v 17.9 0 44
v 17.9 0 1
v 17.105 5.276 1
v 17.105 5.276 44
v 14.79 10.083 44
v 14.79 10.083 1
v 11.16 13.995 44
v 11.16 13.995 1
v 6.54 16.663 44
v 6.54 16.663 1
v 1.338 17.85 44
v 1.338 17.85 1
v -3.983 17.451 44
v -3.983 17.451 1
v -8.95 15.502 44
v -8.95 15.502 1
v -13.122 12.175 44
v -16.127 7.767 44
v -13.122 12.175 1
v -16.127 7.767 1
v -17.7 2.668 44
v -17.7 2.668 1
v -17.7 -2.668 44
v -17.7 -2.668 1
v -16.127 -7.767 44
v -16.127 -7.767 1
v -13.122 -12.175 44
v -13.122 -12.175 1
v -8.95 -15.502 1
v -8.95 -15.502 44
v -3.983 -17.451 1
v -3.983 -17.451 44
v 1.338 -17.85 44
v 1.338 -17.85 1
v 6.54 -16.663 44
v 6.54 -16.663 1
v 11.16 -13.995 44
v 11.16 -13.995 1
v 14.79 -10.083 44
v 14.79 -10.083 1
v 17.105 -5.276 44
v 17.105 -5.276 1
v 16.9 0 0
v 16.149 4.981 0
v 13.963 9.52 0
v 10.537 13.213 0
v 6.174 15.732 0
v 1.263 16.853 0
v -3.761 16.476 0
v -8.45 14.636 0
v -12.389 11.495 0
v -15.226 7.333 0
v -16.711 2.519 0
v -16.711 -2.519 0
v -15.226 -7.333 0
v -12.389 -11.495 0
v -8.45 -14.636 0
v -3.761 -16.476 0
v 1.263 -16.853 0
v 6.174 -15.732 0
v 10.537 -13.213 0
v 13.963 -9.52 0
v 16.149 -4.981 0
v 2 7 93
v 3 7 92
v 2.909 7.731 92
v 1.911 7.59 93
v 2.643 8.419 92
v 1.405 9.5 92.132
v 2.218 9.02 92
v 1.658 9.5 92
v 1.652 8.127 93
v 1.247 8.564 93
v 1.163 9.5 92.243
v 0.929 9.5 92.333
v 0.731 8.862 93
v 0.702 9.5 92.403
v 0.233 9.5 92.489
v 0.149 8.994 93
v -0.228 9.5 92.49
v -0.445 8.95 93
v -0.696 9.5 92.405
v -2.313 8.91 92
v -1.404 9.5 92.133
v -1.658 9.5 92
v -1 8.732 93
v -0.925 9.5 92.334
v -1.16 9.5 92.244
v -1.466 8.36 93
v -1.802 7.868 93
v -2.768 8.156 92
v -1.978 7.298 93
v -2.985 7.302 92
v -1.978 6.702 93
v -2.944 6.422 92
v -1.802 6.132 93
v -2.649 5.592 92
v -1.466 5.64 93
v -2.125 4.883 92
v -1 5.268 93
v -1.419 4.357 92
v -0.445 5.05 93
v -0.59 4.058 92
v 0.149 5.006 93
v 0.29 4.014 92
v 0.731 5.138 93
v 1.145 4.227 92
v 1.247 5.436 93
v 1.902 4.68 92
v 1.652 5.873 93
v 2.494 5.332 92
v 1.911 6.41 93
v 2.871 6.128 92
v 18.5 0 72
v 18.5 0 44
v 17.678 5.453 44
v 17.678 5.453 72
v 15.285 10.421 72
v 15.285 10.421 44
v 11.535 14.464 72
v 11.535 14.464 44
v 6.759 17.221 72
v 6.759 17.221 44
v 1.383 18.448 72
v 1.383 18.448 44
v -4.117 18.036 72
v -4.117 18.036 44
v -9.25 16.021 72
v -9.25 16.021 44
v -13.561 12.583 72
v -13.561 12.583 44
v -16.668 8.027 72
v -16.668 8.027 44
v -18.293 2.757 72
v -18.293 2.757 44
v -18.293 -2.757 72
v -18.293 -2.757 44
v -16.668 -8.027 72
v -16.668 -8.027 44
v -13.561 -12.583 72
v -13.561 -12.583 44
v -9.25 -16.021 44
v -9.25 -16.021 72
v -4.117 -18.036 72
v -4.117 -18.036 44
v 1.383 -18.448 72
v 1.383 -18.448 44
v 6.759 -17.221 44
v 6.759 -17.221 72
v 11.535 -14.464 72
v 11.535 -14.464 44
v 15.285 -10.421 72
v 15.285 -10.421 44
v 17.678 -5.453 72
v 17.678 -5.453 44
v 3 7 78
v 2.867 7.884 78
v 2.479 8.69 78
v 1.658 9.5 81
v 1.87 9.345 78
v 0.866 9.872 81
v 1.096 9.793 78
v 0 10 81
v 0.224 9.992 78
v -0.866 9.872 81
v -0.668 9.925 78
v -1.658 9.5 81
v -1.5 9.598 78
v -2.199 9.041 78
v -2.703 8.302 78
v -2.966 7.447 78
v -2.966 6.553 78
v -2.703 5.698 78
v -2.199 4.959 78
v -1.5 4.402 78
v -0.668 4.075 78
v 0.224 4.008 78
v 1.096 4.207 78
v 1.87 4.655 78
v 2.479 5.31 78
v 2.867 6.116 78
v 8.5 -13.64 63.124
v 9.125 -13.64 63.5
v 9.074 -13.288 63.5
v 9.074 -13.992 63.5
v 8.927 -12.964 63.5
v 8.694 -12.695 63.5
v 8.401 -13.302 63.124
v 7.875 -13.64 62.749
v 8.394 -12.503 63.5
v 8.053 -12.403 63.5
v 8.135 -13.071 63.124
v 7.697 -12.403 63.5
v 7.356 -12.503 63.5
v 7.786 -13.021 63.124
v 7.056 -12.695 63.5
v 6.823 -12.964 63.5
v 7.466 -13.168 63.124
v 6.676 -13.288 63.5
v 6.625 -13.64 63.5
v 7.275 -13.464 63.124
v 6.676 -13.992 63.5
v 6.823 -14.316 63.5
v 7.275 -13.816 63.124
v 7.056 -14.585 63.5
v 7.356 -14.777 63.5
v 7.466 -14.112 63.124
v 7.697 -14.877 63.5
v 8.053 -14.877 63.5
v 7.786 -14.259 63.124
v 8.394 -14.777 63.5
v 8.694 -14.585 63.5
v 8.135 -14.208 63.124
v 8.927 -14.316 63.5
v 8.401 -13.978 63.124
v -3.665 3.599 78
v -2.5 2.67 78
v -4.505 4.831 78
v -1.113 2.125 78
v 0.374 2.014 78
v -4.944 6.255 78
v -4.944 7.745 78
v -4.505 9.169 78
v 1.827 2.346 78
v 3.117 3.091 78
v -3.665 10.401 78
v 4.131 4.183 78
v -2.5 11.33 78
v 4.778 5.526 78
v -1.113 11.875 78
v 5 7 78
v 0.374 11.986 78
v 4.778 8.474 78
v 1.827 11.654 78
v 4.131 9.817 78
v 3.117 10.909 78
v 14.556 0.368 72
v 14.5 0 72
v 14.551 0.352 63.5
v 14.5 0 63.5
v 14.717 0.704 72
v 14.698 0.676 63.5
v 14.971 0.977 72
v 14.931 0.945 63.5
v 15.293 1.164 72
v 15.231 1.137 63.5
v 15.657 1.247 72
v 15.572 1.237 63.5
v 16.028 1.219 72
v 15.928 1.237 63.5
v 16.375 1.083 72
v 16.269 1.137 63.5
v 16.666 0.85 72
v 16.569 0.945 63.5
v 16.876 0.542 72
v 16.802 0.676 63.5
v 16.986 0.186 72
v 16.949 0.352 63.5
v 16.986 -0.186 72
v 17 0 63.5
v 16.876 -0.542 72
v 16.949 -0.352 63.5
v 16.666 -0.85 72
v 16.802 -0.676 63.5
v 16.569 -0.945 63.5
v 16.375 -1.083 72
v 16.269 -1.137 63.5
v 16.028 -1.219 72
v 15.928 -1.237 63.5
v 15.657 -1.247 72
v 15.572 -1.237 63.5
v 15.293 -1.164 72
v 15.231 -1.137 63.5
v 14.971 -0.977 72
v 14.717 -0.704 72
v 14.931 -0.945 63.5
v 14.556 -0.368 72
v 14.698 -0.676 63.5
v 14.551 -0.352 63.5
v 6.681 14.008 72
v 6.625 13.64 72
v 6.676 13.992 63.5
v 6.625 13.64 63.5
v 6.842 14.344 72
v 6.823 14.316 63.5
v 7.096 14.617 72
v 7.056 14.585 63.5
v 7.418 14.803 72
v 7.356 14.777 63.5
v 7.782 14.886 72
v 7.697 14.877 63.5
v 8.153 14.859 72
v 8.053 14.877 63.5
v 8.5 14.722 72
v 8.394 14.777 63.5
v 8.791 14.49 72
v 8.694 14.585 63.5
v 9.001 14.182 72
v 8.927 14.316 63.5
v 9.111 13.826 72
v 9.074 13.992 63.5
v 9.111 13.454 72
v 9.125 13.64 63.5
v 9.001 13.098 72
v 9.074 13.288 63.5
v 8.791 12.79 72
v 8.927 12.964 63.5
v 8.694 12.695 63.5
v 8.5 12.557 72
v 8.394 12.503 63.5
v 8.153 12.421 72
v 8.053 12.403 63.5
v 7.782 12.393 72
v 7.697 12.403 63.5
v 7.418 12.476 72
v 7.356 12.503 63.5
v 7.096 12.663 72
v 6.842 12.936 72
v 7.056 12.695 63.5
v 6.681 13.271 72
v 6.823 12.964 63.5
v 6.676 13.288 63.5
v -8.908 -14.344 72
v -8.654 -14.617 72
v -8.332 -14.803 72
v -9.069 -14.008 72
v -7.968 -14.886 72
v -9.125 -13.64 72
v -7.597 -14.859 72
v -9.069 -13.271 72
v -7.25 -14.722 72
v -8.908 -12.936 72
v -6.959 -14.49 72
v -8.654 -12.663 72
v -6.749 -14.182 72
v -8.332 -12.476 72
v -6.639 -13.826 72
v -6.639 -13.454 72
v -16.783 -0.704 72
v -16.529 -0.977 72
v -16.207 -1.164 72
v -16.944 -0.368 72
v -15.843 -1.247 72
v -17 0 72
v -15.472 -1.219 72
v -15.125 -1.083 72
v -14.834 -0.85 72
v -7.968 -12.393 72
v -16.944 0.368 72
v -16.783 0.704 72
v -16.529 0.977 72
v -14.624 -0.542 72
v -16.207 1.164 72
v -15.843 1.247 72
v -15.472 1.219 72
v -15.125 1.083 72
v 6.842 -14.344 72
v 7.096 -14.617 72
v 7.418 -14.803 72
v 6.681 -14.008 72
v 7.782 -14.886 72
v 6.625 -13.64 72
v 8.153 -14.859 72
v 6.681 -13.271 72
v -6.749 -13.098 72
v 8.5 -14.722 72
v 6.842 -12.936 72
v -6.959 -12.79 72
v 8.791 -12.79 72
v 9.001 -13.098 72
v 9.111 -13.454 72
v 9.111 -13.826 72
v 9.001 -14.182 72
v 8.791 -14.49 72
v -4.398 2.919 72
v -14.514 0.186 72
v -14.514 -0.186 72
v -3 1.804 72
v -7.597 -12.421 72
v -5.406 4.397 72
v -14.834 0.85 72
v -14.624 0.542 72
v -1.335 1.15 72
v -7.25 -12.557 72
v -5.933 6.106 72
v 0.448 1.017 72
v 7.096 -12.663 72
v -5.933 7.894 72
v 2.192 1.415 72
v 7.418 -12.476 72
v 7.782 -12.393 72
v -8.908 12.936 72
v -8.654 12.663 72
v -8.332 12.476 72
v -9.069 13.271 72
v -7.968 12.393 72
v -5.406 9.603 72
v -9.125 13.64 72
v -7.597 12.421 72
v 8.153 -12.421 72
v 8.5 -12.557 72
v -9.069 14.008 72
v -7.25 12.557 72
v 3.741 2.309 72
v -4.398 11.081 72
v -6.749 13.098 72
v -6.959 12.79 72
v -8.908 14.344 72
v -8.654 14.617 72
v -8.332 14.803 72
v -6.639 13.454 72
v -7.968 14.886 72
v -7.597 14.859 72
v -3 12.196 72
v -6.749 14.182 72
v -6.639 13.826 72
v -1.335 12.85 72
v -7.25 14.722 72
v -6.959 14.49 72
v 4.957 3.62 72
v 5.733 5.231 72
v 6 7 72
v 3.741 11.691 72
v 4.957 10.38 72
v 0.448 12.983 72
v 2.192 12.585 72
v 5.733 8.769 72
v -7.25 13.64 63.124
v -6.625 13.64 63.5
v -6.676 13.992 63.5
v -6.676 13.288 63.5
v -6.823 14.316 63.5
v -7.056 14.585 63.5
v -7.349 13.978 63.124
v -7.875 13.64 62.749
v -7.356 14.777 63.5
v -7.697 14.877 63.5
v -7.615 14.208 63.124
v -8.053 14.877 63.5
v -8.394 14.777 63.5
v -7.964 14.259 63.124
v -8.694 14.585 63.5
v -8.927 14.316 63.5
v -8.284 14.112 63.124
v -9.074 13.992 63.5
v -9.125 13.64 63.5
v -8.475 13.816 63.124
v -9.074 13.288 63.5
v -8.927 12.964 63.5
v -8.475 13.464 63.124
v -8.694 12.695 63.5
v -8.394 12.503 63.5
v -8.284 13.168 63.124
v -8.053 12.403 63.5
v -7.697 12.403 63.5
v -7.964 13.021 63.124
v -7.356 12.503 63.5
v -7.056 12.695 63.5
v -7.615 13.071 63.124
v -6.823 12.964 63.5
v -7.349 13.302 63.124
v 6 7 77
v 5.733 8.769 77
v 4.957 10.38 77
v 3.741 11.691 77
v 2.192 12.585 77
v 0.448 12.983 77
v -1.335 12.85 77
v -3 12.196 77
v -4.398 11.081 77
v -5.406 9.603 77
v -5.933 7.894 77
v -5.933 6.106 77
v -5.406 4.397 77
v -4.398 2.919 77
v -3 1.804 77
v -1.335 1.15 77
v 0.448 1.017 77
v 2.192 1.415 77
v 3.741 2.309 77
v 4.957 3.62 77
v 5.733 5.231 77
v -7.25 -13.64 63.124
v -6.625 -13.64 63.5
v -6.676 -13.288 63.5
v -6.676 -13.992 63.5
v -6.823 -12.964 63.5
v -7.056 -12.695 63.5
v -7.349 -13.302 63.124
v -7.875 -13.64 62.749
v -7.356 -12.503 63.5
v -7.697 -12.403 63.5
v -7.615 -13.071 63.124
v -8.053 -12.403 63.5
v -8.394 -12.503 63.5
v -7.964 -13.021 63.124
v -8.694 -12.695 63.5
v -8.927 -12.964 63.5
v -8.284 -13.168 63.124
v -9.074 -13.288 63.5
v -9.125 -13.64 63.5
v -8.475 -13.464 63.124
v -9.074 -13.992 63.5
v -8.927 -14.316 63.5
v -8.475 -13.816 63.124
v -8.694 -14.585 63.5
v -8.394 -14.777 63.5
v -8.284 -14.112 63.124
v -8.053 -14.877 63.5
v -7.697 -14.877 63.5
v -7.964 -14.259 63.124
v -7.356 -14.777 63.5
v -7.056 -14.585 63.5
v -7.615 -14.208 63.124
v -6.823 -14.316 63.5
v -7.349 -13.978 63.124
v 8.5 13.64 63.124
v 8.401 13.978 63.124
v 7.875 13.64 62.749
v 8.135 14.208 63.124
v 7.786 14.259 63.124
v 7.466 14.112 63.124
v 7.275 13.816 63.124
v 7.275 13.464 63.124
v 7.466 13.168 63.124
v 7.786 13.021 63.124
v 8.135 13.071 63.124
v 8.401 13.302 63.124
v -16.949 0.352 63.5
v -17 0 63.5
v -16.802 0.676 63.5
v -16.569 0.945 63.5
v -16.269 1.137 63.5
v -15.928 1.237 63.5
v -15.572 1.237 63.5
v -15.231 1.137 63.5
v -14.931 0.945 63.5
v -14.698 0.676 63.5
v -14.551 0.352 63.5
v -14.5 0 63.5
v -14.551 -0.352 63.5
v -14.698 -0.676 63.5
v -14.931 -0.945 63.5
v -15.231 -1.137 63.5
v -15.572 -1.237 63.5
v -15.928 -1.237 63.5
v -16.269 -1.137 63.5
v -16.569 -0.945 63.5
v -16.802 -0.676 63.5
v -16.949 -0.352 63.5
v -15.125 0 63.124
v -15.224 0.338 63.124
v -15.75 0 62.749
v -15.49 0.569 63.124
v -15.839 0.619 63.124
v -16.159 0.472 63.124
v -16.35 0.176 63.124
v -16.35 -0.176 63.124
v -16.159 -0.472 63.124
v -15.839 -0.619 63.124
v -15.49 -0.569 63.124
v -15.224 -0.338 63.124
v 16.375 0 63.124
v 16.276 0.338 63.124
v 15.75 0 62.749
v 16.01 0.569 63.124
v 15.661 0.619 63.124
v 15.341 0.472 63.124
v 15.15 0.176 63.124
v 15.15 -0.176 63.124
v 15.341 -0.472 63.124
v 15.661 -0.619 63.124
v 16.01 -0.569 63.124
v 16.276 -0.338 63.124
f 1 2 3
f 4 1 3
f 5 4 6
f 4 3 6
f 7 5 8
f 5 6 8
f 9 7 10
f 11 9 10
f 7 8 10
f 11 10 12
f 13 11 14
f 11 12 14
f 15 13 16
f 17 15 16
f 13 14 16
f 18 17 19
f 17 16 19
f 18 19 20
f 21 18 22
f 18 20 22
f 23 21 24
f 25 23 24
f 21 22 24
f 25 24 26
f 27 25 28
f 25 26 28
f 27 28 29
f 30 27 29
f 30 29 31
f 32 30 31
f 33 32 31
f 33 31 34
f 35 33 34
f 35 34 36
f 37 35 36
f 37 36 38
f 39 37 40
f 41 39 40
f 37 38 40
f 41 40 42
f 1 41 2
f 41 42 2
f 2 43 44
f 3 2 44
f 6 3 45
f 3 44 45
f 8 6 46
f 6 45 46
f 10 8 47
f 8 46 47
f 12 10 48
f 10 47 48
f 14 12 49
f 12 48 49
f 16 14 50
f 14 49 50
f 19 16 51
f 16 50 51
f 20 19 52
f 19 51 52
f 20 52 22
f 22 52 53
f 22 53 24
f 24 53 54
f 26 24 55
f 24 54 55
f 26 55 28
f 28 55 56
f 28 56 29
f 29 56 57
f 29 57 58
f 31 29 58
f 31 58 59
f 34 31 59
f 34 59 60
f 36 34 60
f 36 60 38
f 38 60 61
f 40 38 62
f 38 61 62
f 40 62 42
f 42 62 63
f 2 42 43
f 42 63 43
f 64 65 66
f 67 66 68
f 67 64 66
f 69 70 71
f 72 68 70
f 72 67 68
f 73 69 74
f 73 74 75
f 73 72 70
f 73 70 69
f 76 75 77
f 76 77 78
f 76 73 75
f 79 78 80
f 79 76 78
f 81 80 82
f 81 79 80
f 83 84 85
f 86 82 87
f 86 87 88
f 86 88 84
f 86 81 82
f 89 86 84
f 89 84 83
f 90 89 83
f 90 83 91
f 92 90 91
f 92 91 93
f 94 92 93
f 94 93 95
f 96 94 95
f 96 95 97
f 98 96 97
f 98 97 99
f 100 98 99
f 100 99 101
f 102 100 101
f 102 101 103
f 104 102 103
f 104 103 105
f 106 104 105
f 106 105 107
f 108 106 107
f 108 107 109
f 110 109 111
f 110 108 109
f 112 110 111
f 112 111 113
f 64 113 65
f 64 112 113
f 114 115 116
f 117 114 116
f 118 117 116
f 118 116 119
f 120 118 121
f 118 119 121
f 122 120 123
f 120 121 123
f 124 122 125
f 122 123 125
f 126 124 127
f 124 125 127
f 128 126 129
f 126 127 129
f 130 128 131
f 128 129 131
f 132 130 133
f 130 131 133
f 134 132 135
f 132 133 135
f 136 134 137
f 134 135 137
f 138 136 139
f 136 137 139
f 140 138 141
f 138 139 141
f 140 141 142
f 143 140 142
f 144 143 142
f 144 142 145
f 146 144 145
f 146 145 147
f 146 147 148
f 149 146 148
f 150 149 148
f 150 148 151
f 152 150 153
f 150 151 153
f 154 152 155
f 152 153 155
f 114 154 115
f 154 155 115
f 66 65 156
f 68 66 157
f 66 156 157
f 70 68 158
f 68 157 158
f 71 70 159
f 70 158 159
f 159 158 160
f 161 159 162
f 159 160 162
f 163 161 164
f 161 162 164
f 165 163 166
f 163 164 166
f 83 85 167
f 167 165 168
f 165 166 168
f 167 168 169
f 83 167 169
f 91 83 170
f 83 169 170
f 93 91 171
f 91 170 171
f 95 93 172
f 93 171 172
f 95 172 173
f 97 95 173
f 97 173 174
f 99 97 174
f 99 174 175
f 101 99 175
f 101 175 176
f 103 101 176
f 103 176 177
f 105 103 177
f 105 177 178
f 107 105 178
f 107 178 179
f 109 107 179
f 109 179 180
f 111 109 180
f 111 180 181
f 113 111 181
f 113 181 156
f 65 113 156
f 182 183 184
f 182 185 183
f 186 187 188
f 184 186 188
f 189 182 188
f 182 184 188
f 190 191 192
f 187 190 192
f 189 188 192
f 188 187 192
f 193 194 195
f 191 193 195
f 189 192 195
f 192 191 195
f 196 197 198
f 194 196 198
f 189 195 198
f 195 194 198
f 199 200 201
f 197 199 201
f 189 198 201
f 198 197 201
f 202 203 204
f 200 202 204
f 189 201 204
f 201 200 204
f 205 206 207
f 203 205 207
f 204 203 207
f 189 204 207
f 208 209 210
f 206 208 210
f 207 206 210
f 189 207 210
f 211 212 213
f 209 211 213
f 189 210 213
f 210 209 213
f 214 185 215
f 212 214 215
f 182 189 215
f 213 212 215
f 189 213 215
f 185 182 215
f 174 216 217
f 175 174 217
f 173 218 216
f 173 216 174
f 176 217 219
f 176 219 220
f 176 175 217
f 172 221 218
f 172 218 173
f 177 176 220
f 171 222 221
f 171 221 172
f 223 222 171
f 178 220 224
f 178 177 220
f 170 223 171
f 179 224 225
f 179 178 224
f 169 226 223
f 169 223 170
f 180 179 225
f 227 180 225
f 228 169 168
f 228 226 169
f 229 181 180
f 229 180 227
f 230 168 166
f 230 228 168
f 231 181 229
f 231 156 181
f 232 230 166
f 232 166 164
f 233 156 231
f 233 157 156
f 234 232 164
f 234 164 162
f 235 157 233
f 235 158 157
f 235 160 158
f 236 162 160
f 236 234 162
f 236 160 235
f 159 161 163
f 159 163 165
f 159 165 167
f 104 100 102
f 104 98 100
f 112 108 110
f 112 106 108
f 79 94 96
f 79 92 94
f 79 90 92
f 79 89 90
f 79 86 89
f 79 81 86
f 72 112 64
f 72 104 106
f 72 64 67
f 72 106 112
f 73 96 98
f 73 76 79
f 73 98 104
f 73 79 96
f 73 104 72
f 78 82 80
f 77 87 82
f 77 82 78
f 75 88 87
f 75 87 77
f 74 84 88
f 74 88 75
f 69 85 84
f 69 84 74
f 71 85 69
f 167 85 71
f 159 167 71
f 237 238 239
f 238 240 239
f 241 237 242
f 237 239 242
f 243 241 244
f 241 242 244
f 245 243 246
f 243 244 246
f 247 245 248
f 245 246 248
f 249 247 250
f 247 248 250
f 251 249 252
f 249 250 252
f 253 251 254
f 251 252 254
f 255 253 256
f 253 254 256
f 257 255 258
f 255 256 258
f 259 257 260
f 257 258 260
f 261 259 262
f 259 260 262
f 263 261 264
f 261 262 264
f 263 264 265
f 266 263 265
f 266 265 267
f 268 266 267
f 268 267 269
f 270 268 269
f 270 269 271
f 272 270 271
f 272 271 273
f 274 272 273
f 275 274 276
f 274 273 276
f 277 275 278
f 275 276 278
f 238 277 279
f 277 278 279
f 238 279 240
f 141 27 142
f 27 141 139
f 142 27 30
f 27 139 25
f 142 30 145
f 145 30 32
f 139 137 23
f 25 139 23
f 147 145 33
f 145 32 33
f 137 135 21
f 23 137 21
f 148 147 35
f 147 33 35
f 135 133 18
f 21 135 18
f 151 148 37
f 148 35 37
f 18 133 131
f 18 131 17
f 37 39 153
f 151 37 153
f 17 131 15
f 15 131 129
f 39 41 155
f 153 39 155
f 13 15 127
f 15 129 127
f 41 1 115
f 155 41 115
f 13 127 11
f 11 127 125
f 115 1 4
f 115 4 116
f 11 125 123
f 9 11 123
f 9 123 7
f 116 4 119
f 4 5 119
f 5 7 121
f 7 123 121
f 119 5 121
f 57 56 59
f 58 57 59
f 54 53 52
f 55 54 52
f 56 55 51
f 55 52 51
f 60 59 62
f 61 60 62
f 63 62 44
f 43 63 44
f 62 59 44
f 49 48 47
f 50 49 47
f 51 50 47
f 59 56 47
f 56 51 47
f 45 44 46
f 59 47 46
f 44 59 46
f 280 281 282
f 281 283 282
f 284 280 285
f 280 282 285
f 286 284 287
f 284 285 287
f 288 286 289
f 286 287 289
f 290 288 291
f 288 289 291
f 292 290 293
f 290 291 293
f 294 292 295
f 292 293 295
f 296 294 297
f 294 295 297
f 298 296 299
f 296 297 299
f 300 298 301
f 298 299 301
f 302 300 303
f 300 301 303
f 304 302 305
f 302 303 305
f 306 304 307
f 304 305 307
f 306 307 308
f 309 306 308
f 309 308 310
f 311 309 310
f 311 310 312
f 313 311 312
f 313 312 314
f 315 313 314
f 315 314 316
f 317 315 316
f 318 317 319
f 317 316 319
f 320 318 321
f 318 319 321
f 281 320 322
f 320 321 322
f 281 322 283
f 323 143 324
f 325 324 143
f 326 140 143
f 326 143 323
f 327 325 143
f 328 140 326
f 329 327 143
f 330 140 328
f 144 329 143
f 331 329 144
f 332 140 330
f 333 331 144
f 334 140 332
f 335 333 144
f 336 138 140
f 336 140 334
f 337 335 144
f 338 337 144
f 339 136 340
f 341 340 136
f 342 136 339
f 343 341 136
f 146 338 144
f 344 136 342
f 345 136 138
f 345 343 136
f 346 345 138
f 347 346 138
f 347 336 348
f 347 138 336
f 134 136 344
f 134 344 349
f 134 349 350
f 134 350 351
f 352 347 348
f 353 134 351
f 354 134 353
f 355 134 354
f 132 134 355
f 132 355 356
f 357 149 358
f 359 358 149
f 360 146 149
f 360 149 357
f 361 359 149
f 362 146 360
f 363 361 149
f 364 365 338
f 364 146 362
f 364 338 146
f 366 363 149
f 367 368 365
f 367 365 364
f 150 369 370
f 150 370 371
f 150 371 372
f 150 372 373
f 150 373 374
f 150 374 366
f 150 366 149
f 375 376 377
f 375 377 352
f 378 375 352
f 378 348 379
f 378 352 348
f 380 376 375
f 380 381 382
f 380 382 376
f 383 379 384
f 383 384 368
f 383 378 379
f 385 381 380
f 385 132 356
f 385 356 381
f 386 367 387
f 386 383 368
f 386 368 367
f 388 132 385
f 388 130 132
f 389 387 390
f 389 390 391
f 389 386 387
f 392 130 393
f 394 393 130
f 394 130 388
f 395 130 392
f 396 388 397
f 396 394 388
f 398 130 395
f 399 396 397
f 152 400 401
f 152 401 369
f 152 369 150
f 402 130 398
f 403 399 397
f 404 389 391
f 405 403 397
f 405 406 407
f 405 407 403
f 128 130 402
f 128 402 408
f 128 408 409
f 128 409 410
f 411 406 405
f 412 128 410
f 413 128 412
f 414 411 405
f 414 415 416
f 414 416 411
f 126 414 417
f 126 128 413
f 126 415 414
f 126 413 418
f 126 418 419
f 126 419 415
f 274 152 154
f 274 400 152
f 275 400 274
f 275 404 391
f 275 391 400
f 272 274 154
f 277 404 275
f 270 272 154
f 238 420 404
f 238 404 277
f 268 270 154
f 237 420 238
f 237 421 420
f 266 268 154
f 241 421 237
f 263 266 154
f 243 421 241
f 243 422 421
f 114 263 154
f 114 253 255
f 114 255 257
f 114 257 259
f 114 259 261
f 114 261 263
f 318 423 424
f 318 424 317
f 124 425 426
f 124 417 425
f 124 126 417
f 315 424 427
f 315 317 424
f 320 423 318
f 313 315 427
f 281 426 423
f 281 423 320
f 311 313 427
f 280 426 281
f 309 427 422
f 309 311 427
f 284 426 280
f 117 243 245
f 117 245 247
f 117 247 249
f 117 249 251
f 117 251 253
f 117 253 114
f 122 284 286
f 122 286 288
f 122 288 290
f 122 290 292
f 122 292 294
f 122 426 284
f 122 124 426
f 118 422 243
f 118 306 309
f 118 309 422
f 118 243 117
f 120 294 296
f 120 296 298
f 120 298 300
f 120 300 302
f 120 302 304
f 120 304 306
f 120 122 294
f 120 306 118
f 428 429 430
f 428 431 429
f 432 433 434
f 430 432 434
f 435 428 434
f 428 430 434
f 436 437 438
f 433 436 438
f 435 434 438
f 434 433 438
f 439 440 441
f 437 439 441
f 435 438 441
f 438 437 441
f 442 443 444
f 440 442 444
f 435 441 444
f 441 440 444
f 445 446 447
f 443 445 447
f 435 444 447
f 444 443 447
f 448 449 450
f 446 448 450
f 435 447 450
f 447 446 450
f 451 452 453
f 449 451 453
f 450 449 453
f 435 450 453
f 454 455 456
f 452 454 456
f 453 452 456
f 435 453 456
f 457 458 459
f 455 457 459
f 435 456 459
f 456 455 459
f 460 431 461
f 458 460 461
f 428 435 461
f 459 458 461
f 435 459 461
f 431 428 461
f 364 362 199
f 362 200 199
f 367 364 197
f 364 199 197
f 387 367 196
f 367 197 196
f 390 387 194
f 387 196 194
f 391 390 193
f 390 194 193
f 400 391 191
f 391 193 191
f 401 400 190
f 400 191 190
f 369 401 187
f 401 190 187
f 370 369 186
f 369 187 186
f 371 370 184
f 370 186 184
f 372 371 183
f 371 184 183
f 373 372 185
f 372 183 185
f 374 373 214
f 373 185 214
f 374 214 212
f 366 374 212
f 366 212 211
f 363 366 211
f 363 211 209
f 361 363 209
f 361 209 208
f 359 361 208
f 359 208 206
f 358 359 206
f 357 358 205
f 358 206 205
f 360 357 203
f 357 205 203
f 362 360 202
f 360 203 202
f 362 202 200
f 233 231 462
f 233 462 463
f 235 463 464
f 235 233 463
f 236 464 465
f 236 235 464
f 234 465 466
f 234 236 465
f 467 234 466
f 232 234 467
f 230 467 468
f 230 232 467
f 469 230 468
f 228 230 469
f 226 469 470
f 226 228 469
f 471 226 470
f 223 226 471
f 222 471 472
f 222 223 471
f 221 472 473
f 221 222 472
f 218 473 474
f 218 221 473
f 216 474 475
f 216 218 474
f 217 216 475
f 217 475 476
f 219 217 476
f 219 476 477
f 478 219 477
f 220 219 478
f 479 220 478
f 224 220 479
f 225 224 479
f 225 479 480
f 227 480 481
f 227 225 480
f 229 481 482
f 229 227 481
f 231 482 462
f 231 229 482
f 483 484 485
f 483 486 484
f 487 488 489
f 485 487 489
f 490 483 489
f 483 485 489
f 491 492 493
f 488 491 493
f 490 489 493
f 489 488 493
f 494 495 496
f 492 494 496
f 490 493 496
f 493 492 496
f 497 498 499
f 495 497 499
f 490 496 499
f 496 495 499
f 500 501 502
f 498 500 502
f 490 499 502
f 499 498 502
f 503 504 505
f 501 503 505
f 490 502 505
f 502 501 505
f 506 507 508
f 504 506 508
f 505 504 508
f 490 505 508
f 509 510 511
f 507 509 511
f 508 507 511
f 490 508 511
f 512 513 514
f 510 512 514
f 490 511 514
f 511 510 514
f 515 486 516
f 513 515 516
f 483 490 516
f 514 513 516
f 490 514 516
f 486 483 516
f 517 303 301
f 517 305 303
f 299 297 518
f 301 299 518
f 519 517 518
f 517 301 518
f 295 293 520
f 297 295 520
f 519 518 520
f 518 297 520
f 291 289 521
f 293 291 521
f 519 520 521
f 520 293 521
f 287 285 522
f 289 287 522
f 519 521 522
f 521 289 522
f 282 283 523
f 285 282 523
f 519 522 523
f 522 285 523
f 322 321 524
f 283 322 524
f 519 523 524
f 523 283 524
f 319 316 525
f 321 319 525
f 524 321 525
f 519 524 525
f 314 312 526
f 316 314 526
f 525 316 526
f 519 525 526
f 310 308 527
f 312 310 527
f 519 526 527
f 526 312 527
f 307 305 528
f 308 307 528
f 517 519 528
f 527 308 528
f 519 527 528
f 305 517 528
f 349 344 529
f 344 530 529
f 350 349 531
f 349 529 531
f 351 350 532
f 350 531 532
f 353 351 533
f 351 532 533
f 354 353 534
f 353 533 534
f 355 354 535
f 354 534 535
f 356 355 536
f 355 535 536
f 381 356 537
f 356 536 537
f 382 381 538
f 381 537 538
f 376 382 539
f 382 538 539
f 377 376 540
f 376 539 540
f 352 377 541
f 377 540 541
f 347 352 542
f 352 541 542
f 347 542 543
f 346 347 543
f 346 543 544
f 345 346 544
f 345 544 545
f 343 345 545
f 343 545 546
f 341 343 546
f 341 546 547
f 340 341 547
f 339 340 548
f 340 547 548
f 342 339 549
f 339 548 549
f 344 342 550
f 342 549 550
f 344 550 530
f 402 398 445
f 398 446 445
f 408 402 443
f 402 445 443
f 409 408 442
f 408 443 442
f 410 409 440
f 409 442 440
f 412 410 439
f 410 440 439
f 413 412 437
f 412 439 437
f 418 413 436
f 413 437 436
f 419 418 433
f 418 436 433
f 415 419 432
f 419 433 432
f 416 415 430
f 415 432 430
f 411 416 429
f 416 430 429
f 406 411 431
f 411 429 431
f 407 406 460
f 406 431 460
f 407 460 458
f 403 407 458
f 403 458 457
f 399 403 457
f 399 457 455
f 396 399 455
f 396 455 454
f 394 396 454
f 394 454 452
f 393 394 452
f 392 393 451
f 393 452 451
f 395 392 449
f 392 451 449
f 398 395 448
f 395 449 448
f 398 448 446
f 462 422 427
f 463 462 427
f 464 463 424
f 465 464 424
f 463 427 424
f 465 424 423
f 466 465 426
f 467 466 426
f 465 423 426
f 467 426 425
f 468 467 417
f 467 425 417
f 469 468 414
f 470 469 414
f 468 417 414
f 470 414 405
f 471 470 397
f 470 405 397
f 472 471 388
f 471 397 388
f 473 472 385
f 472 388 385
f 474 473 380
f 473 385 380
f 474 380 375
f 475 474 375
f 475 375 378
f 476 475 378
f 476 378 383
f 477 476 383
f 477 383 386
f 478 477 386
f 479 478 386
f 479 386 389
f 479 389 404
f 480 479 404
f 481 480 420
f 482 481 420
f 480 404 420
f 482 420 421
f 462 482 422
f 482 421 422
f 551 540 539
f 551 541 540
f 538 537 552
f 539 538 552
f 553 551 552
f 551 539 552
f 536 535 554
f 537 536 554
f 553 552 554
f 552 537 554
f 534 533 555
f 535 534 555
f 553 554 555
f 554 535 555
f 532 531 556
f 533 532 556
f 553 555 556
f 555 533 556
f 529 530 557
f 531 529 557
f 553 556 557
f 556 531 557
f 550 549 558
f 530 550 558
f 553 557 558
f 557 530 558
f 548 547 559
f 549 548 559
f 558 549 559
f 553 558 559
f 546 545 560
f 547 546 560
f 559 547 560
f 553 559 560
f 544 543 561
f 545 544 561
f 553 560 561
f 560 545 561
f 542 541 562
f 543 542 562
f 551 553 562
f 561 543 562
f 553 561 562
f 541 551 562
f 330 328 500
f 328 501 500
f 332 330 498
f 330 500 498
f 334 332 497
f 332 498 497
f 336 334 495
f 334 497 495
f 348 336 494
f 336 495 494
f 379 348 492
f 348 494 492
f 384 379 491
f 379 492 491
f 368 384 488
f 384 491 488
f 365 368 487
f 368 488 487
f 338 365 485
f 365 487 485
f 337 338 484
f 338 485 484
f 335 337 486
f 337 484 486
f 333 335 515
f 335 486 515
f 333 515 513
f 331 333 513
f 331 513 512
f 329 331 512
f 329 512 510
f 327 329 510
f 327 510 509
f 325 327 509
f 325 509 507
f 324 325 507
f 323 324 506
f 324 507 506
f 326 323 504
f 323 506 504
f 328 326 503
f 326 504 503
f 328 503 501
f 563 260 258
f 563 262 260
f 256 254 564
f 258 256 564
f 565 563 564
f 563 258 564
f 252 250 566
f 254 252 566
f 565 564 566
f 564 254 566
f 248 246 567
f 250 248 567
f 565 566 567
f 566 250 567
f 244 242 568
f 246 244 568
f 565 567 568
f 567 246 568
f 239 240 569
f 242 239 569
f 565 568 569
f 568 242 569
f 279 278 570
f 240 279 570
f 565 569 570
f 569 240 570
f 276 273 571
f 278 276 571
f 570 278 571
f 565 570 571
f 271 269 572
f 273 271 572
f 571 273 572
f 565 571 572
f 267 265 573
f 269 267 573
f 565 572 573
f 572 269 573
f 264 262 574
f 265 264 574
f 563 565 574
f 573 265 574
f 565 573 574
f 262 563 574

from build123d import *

# Parameters (mm, degrees)
SKETCH_1_R          = 17.9
EXTRUDE_1_DEPTH     = 44
SKETCH_2_R          = 18.5
EXTRUDE_2_DEPTH     = 28
SKETCH_3_R          = 6
EXTRUDE_3_DEPTH     = 6
SKETCH_4_R          = 3
EXTRUDE_4_DEPTH     = 15
CUT_EXTRUDE_START   = -12
CUT_EXTRUDE_1_DEPTH = 12
M3X0_5_1_D          = 2.5
M3X0_5_1_DEPTH      = 8.5
M3X0_5_1_TIP        = 0.751075774
CHAMFER_1_SIZE      = 1
CHAMFER_2_SIZE      = 1
CHAMFER_3_SIZE      = 1


with BuildPart() as part:
    # ｽｹｯﾁ1 → ﾎﾞｽ - 押し出し1 (new body)
    with BuildSketch(Plane.XY):
        Circle(SKETCH_1_R)
    extrude(amount=EXTRUDE_1_DEPTH)

    # ｽｹｯﾁ2 → ﾎﾞｽ - 押し出し2 (add)
    with BuildSketch(Plane.XY.offset(44)):
        Circle(SKETCH_2_R)
    extrude(amount=EXTRUDE_2_DEPTH)

    # ｽｹｯﾁ3 → ﾎﾞｽ - 押し出し3 (add)
    with BuildSketch(Plane.XY.offset(72)):
        with Locations((0, 7)):
            Circle(SKETCH_3_R)
    extrude(amount=EXTRUDE_3_DEPTH)

    # ｽｹｯﾁ4 → ﾎﾞｽ - 押し出し4 (add)
    with BuildSketch(Plane.XY.offset(78)):
        with Locations((0, 7)):
            Circle(SKETCH_4_R)
    extrude(amount=EXTRUDE_4_DEPTH)

    # ｽｹｯﾁ5 → ｶｯﾄ - 押し出し1 (cut)
    with BuildSketch(Plane.XY.offset(93).offset(CUT_EXTRUDE_START)):
        with BuildLine():
            ThreePointArc((1.658312395, 9.5), (0, 10), (-1.658312395, 9.5))
            Line((-1.658312395, 9.5), (0, 9.5))
            Line((0, 9.5), (1.658312395, 9.5))
        make_face()
    extrude(amount=CUT_EXTRUDE_1_DEPTH, mode=Mode.SUBTRACT)

    # M3x0.5 ねじ穴1
    with Locations(Plane(origin=(-15.75, 0, 72), x_dir=(1, 0, 0), z_dir=(0, 0, 1))):
        with Locations((0, 0), (7.875, -13.63990011), (23.625, -13.63990011), (31.5, 0), (23.625, 13.63990011), (7.875, 13.63990011)):
            Hole(M3X0_5_1_D / 2, depth=M3X0_5_1_DEPTH)
            with Locations((0, 0, -(M3X0_5_1_DEPTH + M3X0_5_1_TIP / 2))):  # 118° drill point
                Cone(0, M3X0_5_1_D / 2, M3X0_5_1_TIP, mode=Mode.SUBTRACT)

    # 面取り1
    # the kernel refuses this chamfer: 1 mm, written as the material it takes off along each edge
    with BuildSketch(Plane(origin=(0, 7, 93), x_dir=(0.27051002147704706, 0.9627171590246472, 0), z_dir=(0.9627171590246472, -0.27051002147704706, 0))) as chamfer_1_piece_1:
        Polygon((3, -CHAMFER_1_SIZE), (3 - CHAMFER_1_SIZE, 0), (3, 0), align=None)
    revolve(axis=Axis((0, 7, 93), (0, 0, 1)), revolution_arc=285.694618346, mode=Mode.SUBTRACT)
    with BuildSketch(Plane(origin=(0, 7, 93), x_dir=(1, 0, 0), z_dir=(0, -1, 0))) as chamfer_1_piece_2:
        Polygon((3, -CHAMFER_1_SIZE), (3 - CHAMFER_1_SIZE, 0), (3, 0), align=None)
    revolve(axis=Axis((0, 7, 93), (0, 0, 1)), revolution_arc=105.565976033, mode=Mode.SUBTRACT)

    # 面取り2
    chamfer_2_edges = [part.edges().sort_by_distance(p)[0] for p in [
        (-6, 7, 78),
    ]]
    chamfer(chamfer_2_edges, length=CHAMFER_2_SIZE)

    # 面取り3
    chamfer_3_edges = [part.edges().sort_by_distance(p)[0] for p in [
        (-17.9, 0, 0),
    ]]
    chamfer(chamfer_3_edges, length=CHAMFER_3_SIZE)


solid = part.part
